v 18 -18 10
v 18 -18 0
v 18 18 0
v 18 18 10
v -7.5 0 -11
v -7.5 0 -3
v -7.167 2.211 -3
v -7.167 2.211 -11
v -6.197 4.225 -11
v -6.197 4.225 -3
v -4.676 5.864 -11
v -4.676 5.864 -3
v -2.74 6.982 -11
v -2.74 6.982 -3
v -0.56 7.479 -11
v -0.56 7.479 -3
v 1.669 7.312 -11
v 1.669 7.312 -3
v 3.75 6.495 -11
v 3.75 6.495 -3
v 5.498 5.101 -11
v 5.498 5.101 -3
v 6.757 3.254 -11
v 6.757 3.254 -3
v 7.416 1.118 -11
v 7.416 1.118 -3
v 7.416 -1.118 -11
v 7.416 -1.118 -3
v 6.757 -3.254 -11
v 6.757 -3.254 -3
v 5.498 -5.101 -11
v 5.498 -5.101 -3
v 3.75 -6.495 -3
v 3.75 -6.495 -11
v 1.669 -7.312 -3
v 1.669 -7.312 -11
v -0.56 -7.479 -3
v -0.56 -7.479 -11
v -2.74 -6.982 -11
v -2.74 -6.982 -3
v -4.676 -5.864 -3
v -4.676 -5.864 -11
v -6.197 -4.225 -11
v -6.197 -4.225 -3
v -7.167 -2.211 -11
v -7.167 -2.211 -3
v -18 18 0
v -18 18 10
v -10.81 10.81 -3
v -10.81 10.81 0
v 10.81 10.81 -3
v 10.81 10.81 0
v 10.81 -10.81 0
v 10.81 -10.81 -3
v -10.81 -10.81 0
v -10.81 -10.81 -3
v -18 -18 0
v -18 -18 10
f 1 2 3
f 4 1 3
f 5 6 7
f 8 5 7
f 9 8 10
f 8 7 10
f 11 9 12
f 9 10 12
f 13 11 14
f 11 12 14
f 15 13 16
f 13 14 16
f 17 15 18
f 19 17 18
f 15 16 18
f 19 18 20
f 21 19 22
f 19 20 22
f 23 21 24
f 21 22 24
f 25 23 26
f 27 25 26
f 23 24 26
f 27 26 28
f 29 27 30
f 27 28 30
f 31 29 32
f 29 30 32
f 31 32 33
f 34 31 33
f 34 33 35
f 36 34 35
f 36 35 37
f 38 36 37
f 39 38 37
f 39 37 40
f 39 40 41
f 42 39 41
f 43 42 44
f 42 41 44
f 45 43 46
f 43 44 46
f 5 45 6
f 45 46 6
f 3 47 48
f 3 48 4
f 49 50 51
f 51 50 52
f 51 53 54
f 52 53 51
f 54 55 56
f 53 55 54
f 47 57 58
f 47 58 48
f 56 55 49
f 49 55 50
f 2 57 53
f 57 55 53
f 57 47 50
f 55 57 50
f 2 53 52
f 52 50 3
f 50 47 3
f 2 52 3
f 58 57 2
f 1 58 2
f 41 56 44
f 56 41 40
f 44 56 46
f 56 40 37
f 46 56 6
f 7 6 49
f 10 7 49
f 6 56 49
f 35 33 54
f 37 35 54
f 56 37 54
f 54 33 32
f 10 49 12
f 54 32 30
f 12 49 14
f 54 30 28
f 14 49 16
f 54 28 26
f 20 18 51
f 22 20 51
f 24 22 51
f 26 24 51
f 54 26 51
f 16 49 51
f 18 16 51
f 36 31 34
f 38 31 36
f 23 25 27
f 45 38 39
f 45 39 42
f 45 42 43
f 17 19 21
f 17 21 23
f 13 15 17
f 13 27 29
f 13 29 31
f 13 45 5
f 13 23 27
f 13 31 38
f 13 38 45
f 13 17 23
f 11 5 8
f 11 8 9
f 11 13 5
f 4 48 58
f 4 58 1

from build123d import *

# Parameters (mm, degrees)
SKETCH_1_W      = 36
SKETCH_1_H      = 36
EXTRUDE_1_DEPTH = 10
SKETCH_1_3_W    = 21.620111732
SKETCH_1_3_H    = 21.620111732
EXTRUDE_2_DEPTH = 3
SKETCH_2_R      = 7.5
EXTRUDE_3_DEPTH = 8


with BuildPart() as part:
    # 草图1 → 凸台-拉伸1 (new body)
    with BuildSketch(Plane.XY):
        Rectangle(SKETCH_1_W, SKETCH_1_H)
    extrude(amount=EXTRUDE_1_DEPTH)

    # 草图1<3> → 凸台-拉伸2 (add)
    with BuildSketch(Plane.XY):
        Rectangle(SKETCH_1_3_W, SKETCH_1_3_H)
    extrude(amount=-EXTRUDE_2_DEPTH)

    # 草图2 → 凸台-拉伸3 (add)
    with BuildSketch(Plane(origin=(0, 0, -3), x_dir=(-1, 0, 0), z_dir=(0, 0, -1))):
        Circle(SKETCH_2_R)
    extrude(amount=EXTRUDE_3_DEPTH)


solid = part.part
